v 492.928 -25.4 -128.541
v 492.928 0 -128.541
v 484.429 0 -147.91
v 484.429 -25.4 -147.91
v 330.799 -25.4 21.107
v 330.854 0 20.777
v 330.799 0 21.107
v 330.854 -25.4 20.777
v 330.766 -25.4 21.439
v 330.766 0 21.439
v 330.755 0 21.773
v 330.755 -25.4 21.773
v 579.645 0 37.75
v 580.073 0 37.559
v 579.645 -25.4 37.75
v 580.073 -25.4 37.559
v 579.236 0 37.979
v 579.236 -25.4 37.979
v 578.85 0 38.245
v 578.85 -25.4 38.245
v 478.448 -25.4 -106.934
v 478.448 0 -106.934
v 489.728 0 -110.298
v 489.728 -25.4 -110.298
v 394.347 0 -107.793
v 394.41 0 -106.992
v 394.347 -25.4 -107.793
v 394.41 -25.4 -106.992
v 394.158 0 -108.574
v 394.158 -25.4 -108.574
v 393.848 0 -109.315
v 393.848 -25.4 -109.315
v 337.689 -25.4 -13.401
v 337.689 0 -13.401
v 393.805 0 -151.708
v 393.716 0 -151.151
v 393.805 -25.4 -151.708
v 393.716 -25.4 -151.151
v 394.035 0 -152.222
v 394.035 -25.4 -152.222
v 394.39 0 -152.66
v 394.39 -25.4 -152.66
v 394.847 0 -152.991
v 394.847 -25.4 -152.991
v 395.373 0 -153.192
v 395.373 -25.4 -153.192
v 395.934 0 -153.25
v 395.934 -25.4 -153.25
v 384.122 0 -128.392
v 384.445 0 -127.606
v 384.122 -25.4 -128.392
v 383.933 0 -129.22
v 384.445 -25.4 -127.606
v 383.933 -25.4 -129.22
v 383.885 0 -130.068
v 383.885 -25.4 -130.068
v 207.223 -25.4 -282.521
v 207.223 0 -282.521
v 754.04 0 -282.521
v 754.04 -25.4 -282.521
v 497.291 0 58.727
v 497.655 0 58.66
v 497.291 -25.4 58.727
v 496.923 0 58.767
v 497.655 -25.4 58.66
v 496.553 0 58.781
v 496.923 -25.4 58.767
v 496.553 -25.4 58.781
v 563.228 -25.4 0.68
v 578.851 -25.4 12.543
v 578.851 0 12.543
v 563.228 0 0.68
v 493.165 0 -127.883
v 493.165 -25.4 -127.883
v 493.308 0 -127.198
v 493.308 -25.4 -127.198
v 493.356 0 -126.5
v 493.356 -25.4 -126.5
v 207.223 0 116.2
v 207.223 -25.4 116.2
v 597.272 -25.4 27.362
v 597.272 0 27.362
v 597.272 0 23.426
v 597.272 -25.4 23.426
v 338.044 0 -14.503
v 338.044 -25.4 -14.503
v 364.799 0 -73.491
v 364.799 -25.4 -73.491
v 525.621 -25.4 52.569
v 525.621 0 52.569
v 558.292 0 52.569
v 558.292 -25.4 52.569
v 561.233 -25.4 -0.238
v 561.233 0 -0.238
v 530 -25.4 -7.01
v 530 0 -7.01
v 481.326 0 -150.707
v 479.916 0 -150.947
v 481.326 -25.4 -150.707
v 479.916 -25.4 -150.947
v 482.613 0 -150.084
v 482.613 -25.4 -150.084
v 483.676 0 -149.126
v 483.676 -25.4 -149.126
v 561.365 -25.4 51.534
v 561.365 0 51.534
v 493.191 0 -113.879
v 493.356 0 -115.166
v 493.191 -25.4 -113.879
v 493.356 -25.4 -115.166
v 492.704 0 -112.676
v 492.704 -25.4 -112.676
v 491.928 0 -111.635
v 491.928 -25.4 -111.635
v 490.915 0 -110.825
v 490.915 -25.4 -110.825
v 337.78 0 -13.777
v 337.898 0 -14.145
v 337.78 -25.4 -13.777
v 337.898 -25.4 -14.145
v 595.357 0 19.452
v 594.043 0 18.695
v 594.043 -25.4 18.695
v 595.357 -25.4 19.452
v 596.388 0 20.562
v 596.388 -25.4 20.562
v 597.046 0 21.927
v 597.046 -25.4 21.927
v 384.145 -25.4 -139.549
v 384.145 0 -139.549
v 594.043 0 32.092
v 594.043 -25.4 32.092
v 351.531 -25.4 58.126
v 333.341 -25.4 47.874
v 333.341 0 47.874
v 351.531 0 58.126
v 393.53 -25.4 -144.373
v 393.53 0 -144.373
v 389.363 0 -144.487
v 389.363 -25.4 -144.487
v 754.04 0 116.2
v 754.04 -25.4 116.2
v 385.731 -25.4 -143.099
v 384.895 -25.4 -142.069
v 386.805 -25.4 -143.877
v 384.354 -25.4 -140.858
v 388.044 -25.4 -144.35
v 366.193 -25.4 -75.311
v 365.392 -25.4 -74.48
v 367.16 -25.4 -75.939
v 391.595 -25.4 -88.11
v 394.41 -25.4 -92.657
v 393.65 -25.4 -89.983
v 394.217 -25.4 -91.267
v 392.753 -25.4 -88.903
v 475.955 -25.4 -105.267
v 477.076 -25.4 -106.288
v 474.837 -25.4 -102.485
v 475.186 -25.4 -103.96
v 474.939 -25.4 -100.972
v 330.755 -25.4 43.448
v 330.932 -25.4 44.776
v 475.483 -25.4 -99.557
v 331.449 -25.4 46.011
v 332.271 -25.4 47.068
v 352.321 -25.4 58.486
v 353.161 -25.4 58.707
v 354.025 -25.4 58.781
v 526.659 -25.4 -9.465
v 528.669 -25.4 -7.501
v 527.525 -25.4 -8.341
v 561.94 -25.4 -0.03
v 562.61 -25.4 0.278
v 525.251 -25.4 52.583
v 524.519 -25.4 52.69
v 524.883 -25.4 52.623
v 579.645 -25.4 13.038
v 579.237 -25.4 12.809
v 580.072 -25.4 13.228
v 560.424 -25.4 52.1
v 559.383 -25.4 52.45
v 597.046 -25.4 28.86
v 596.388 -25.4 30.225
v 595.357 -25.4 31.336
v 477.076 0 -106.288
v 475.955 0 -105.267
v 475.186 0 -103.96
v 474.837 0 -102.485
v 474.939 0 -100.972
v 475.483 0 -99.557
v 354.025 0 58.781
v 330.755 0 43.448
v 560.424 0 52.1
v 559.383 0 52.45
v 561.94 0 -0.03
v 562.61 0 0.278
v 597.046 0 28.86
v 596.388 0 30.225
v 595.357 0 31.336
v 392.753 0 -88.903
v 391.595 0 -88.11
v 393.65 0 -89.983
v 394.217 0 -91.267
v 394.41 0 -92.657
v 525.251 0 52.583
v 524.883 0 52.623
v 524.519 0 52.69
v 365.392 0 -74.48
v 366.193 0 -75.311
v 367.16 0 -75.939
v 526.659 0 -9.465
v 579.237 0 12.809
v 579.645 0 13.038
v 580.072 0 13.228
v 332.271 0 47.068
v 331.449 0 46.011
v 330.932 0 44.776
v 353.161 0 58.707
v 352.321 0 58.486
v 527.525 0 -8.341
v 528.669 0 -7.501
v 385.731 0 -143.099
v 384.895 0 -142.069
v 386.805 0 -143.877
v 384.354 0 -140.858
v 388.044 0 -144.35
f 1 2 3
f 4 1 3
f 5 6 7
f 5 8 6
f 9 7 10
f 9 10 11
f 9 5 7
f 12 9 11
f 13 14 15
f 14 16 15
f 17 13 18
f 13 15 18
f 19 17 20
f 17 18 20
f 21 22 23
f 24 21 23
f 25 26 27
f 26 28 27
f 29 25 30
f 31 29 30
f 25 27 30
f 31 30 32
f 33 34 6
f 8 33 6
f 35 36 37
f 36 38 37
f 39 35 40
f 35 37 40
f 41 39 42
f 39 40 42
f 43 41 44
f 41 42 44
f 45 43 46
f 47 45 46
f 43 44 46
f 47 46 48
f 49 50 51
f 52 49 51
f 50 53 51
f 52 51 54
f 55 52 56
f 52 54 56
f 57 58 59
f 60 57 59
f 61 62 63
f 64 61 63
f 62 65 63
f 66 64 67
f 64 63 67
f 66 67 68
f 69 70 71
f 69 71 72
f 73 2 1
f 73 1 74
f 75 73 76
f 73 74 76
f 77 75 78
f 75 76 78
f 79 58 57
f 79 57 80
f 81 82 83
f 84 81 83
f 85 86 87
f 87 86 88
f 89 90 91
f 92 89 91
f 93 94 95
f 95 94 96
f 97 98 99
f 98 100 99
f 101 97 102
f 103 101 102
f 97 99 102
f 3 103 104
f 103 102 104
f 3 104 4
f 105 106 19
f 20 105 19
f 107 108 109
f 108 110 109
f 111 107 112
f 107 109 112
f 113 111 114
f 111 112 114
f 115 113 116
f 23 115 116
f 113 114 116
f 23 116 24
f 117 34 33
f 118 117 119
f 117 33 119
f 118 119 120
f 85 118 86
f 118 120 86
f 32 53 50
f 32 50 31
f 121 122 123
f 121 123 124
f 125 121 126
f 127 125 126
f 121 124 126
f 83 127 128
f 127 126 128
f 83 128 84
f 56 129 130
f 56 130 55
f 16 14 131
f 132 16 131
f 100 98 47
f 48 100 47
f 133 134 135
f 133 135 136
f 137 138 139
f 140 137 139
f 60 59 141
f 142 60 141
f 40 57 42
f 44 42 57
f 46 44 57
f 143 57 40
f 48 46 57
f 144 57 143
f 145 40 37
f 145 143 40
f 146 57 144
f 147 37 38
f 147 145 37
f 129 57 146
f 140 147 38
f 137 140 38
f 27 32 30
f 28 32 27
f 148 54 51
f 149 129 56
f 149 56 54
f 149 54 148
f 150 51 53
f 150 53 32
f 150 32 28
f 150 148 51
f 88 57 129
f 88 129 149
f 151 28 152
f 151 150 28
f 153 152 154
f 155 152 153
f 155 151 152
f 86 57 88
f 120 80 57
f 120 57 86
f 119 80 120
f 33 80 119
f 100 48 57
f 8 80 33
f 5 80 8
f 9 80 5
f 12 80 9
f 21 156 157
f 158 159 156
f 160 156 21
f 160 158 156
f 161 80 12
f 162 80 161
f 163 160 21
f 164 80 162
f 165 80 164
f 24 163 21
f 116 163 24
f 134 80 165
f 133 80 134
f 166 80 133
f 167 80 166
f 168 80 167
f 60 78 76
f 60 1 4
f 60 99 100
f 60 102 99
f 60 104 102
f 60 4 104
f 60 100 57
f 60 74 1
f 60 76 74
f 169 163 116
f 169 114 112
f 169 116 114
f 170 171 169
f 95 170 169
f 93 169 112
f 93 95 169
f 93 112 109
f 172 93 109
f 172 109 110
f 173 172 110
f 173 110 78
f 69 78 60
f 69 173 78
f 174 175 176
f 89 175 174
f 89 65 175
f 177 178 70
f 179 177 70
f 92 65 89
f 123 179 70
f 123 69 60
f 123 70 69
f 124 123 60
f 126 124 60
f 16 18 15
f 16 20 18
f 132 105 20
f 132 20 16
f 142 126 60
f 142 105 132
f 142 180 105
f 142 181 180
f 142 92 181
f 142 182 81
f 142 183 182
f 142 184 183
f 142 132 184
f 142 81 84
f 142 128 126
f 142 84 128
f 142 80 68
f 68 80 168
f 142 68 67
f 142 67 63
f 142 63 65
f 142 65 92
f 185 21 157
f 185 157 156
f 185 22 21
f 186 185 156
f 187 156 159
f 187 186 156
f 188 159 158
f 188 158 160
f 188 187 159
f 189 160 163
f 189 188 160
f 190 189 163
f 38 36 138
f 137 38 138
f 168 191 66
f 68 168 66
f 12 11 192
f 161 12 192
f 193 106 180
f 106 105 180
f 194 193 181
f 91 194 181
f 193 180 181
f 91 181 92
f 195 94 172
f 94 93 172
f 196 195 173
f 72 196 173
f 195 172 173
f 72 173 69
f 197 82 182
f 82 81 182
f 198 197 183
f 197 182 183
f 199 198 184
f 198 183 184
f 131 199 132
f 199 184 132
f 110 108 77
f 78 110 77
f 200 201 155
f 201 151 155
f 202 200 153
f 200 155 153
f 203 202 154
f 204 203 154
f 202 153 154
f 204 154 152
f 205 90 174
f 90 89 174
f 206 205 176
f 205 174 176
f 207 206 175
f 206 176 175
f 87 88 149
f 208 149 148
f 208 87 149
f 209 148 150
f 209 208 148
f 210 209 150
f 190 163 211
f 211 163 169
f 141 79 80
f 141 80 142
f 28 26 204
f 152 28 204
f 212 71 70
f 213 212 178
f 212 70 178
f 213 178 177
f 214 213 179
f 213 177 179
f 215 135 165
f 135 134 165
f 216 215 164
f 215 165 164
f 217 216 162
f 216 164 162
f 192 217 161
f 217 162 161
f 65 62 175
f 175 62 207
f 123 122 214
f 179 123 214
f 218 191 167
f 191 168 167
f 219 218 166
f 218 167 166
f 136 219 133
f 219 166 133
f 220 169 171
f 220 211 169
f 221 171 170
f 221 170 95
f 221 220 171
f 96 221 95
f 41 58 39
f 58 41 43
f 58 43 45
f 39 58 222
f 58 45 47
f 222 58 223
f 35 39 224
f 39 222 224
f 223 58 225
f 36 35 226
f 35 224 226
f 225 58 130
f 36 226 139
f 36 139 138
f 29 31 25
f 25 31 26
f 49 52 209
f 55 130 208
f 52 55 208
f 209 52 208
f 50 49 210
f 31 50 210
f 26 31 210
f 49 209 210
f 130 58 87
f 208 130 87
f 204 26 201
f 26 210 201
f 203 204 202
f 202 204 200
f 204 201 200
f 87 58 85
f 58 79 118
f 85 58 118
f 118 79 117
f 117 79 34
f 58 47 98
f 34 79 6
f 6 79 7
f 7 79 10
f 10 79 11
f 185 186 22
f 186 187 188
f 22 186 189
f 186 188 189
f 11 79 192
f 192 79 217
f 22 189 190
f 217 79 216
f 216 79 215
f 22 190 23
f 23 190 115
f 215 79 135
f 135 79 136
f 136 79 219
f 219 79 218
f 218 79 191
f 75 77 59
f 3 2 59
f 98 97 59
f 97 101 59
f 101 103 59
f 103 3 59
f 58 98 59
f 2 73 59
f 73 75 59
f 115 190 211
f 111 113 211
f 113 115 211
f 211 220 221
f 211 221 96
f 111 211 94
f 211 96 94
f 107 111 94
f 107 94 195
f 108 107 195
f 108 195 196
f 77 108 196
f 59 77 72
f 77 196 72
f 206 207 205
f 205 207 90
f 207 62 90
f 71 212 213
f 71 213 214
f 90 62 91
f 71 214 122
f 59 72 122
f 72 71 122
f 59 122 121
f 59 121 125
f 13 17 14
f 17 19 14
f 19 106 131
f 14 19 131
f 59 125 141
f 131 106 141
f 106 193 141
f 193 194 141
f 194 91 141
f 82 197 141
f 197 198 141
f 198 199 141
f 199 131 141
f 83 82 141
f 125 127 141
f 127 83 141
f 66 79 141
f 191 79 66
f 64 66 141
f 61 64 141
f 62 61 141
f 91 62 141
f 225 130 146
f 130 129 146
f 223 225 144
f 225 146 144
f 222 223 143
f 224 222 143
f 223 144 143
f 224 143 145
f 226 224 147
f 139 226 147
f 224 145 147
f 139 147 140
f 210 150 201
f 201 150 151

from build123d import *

# Parameters (mm, degrees)
F0_W     = 546.8174844539
F0_H     = 398.7210936817
F1_DEPTH = 25.4
F3_DEPTH = 25.401
F4_R     = 5.08
F5_R     = 2.159


# Not quite as in the source:
# - a feature names something its author has since deleted; it is built from what else it names


with BuildPart() as f1:
    # F0 (on Front) → F1 (new body)
    with BuildSketch(Plane.XZ):
        with Locations((480.6314062452, -83.1606246494)):
            Rectangle(F0_W, F0_H)
        Polygon((330.755193297, 46.4165987058), (352.6924322393, 58.7807495217), (497.1109463772, 58.7807495217), (525.0629135844, 52.5692068872), (560.0028810439, 52.5692068872), (579.4140003676, 37.8167783416), (597.2722044557, 30.8287886525), (597.2722044557, 19.9585742536), (579.4140003676, 12.9705761138), (562.3322031939, 0), (493.2287427939, -14.9813921496), (476.9234201392, -48.3684665562), (464.5003348701, -54.5800176413), (451.3007750821, -98.8373032779), (493.3564558907, -111.380243164), (493.3564558907, -127.5657196522), (483.1349796749, -150.8590341088), (393.7753742012, -153.3092504783), (393.5303500451, -144.3731980569), (384.284519278, -144.626716252), (383.8496065952, -128.7654126401), (394.4104195536, -108.2215374956), (394.4104195536, -64.4587469067), (400.6219790893, -38.8361145254), (368.0113337798, -22.5307876454), (337.8036322085, -13.9719399936), (330.755193297, 21.270351746), align=None, mode=Mode.SUBTRACT)
    extrude(amount=F1_DEPTH)

    # F2 (on face) → F3 (cut, through all)
    with BuildSketch(Plane.XZ.offset(25.4)):
        Polygon((527.7804729939, -7.4906960748), (337.8036322085, -13.9719399936), (365.5445277691, -75.1346200705), (401.7401635647, -93.1630060077), (472.3286154864, -105.1087732209), align=None)
    extrude(amount=-F3_DEPTH, mode=Mode.SUBTRACT)

    # F4
    f4_edges = [f1.edges().sort_by_distance(p)[0] for p in [
        (330.755193, -12.7, 21.270352),
        (330.755193, -12.7, 46.416599),
        (352.692432, -12.7, 58.78075),
        (337.803632, -12.7, -13.97194),
        (394.41042, -12.7, -108.221537),
        (383.849607, -12.7, -128.765413),
        (384.284519, -12.7, -144.626716),
        (483.13498, -12.7, -150.859034),
        (493.356456, -12.7, -127.56572),
        (562.332203, -12.7, 0),
        (579.414, -12.7, 12.970576),
        (597.272204, -12.7, 19.958574),
        (493.356456, -12.7, -111.380243),
        (525.062914, -12.7, 52.569207),
        (560.002881, -12.7, 52.569207),
        (579.414, -12.7, 37.816778),
        (597.272204, -12.7, 30.828789),
        (497.110946, -12.7, 58.78075),
        (365.544528, -12.7, -75.13462),
        (472.328615, -12.7, -105.108773),
        (394.41042, -12.7, -89.512194),
        (527.780473, -12.7, -7.490696),
    ]]
    fillet(f4_edges, radius=F4_R)

    # F5
    f5_edges = [f1.edges().sort_by_distance(p)[0] for p in [
        (393.775374, -12.7, -153.30925),
    ]]
    fillet(f5_edges, radius=F5_R)


solid = f1.part
